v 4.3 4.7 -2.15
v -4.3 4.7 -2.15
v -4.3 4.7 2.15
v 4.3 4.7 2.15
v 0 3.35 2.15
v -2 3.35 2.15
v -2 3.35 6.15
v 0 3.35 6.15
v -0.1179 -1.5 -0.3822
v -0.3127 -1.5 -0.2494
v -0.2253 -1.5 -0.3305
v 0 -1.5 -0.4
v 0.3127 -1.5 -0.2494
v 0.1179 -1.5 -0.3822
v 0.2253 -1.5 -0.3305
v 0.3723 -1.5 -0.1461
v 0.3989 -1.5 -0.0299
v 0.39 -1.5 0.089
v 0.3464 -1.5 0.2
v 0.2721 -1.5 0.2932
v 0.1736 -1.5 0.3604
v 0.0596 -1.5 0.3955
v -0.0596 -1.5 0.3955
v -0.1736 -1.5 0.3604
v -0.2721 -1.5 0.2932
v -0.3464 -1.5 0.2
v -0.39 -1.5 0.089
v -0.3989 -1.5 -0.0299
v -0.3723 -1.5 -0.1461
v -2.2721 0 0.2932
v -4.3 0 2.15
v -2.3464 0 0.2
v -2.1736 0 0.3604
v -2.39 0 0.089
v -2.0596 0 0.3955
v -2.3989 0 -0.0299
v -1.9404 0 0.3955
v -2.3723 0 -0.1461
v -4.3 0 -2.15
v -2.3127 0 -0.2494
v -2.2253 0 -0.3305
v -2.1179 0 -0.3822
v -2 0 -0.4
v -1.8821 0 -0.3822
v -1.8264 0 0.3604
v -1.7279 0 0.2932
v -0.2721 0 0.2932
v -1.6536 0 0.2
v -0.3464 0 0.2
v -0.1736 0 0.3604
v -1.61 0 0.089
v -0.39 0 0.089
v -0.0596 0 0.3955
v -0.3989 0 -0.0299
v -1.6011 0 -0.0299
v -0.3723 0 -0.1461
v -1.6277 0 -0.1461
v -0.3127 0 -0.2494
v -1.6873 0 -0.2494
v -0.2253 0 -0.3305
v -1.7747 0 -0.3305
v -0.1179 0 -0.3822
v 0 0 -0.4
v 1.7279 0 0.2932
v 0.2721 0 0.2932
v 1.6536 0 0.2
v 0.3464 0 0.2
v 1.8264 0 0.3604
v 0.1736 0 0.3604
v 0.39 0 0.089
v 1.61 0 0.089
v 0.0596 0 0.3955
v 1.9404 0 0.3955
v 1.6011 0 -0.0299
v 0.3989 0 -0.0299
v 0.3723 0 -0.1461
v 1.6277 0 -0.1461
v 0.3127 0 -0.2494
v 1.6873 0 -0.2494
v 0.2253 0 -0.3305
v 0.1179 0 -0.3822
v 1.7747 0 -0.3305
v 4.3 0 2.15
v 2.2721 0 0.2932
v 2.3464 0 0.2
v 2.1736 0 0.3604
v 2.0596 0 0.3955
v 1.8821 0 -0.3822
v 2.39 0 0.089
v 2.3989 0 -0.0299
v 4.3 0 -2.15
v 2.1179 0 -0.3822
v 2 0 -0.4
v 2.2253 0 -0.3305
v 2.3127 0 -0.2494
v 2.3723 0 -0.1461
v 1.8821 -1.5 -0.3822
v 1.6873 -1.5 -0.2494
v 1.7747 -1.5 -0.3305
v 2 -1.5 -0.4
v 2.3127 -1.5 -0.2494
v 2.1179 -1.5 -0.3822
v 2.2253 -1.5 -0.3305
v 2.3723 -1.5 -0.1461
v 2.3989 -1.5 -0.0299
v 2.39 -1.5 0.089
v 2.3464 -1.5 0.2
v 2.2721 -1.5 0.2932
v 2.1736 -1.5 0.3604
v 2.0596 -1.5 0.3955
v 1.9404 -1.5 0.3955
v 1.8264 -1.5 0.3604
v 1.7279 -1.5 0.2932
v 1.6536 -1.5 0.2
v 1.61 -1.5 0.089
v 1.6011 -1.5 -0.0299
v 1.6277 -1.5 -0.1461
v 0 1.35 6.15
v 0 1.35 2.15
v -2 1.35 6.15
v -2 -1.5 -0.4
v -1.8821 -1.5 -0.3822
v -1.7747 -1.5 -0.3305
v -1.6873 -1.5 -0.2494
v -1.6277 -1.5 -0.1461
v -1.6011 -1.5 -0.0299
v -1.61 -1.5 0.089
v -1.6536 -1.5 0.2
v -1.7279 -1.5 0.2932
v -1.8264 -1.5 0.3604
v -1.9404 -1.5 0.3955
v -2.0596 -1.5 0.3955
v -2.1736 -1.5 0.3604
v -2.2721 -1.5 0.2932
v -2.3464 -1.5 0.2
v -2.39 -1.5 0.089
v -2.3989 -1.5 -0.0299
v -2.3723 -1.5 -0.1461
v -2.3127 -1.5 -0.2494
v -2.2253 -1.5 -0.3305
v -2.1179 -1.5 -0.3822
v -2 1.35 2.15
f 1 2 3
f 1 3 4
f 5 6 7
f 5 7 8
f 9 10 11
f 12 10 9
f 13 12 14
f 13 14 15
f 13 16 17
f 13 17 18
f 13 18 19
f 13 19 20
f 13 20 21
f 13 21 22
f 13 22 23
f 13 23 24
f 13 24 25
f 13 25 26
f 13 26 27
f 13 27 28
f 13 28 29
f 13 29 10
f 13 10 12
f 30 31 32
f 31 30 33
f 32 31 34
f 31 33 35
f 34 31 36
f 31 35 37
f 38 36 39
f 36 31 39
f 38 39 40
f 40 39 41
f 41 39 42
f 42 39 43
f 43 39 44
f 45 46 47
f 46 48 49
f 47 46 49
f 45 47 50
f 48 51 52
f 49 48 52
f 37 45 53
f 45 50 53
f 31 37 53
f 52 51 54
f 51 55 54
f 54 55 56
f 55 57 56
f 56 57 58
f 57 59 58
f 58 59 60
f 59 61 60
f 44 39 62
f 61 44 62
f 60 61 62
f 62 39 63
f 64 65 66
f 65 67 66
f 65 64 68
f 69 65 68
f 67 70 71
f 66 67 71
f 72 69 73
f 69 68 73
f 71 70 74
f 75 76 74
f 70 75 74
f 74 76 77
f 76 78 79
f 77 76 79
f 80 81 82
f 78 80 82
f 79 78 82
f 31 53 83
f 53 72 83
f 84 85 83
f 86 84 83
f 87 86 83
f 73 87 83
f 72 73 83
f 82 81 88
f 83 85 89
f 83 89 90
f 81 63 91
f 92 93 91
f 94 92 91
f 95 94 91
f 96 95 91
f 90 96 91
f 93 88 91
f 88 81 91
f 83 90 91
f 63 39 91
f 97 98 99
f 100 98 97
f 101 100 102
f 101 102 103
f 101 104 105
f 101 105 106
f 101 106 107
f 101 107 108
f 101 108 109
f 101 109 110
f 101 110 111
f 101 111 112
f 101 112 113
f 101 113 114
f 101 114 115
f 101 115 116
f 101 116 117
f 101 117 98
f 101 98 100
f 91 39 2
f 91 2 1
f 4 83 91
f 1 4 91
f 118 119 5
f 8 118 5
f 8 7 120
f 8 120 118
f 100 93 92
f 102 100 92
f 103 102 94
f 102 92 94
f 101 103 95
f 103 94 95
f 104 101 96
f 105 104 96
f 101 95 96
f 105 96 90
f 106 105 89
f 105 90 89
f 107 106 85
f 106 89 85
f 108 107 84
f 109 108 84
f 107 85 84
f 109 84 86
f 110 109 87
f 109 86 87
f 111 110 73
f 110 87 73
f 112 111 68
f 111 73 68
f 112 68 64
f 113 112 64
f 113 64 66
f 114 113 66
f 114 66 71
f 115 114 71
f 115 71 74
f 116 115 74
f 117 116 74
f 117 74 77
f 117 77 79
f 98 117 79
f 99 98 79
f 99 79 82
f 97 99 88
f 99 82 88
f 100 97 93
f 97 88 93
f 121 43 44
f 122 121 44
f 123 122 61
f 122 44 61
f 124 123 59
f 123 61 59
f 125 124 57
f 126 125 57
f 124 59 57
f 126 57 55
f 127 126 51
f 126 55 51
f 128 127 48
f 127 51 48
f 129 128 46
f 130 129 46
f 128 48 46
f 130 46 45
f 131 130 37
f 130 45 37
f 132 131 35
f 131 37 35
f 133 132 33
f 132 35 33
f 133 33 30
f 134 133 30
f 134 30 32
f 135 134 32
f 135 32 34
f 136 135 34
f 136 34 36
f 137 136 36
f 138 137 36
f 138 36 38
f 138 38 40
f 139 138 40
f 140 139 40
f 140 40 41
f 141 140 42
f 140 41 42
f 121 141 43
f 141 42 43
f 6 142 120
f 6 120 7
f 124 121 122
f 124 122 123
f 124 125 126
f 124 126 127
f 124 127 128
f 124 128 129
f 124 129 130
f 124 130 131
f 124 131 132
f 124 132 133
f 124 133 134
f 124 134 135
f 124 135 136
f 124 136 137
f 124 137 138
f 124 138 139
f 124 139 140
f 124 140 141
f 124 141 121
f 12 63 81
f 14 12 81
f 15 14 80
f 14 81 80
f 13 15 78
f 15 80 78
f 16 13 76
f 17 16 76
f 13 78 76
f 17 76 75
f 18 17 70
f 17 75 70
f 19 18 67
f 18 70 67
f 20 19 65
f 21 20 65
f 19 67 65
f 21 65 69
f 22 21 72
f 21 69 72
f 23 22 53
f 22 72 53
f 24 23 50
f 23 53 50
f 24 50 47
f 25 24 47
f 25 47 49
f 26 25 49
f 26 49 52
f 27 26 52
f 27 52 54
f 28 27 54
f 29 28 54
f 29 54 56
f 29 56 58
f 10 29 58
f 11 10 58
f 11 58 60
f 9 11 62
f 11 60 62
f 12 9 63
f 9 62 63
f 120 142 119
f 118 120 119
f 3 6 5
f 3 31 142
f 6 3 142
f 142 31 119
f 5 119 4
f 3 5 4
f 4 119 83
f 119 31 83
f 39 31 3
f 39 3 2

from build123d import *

# Parameters (mm, degrees)
SKETCH1_W           = 8.6
SKETCH1_H           = 4.3
BOSS_EXTRUDE1_DEPTH = 4.7
SKETCH2_W           = 2
SKETCH2_H           = 2
BOSS_EXTRUDE2_DEPTH = 4
SKETCH3_R           = 0.4
BOSS_EXTRUDE3_DEPTH = 1.5


with BuildPart() as part:
    # Sketch1 → Boss-Extrude1 (new body)
    with BuildSketch(Plane(origin=(0, 0, 0), x_dir=(1, 0, 0), z_dir=(0, 1, 0))):
        Rectangle(SKETCH1_W, SKETCH1_H)
    extrude(amount=BOSS_EXTRUDE1_DEPTH)

    # Sketch2 → Boss-Extrude2 (add)
    with BuildSketch(Plane.XY.offset(2.15)):
        with Locations((-1, 2.35)):
            Rectangle(SKETCH2_W, SKETCH2_H)
    extrude(amount=BOSS_EXTRUDE2_DEPTH)

    # Sketch3 → Boss-Extrude3 (add)
    with BuildSketch(Plane.XZ):
        with Locations(Location((-2, 0, 0), (0, 0, 270))):
            Circle(SKETCH3_R)
        with Locations(Location((0, 0, 0), (0, 0, 270))):
            Circle(SKETCH3_R)
        with Locations(Location((2, 0, 0), (0, 0, 270))):
            Circle(SKETCH3_R)
    extrude(amount=BOSS_EXTRUDE3_DEPTH)


solid = part.part
